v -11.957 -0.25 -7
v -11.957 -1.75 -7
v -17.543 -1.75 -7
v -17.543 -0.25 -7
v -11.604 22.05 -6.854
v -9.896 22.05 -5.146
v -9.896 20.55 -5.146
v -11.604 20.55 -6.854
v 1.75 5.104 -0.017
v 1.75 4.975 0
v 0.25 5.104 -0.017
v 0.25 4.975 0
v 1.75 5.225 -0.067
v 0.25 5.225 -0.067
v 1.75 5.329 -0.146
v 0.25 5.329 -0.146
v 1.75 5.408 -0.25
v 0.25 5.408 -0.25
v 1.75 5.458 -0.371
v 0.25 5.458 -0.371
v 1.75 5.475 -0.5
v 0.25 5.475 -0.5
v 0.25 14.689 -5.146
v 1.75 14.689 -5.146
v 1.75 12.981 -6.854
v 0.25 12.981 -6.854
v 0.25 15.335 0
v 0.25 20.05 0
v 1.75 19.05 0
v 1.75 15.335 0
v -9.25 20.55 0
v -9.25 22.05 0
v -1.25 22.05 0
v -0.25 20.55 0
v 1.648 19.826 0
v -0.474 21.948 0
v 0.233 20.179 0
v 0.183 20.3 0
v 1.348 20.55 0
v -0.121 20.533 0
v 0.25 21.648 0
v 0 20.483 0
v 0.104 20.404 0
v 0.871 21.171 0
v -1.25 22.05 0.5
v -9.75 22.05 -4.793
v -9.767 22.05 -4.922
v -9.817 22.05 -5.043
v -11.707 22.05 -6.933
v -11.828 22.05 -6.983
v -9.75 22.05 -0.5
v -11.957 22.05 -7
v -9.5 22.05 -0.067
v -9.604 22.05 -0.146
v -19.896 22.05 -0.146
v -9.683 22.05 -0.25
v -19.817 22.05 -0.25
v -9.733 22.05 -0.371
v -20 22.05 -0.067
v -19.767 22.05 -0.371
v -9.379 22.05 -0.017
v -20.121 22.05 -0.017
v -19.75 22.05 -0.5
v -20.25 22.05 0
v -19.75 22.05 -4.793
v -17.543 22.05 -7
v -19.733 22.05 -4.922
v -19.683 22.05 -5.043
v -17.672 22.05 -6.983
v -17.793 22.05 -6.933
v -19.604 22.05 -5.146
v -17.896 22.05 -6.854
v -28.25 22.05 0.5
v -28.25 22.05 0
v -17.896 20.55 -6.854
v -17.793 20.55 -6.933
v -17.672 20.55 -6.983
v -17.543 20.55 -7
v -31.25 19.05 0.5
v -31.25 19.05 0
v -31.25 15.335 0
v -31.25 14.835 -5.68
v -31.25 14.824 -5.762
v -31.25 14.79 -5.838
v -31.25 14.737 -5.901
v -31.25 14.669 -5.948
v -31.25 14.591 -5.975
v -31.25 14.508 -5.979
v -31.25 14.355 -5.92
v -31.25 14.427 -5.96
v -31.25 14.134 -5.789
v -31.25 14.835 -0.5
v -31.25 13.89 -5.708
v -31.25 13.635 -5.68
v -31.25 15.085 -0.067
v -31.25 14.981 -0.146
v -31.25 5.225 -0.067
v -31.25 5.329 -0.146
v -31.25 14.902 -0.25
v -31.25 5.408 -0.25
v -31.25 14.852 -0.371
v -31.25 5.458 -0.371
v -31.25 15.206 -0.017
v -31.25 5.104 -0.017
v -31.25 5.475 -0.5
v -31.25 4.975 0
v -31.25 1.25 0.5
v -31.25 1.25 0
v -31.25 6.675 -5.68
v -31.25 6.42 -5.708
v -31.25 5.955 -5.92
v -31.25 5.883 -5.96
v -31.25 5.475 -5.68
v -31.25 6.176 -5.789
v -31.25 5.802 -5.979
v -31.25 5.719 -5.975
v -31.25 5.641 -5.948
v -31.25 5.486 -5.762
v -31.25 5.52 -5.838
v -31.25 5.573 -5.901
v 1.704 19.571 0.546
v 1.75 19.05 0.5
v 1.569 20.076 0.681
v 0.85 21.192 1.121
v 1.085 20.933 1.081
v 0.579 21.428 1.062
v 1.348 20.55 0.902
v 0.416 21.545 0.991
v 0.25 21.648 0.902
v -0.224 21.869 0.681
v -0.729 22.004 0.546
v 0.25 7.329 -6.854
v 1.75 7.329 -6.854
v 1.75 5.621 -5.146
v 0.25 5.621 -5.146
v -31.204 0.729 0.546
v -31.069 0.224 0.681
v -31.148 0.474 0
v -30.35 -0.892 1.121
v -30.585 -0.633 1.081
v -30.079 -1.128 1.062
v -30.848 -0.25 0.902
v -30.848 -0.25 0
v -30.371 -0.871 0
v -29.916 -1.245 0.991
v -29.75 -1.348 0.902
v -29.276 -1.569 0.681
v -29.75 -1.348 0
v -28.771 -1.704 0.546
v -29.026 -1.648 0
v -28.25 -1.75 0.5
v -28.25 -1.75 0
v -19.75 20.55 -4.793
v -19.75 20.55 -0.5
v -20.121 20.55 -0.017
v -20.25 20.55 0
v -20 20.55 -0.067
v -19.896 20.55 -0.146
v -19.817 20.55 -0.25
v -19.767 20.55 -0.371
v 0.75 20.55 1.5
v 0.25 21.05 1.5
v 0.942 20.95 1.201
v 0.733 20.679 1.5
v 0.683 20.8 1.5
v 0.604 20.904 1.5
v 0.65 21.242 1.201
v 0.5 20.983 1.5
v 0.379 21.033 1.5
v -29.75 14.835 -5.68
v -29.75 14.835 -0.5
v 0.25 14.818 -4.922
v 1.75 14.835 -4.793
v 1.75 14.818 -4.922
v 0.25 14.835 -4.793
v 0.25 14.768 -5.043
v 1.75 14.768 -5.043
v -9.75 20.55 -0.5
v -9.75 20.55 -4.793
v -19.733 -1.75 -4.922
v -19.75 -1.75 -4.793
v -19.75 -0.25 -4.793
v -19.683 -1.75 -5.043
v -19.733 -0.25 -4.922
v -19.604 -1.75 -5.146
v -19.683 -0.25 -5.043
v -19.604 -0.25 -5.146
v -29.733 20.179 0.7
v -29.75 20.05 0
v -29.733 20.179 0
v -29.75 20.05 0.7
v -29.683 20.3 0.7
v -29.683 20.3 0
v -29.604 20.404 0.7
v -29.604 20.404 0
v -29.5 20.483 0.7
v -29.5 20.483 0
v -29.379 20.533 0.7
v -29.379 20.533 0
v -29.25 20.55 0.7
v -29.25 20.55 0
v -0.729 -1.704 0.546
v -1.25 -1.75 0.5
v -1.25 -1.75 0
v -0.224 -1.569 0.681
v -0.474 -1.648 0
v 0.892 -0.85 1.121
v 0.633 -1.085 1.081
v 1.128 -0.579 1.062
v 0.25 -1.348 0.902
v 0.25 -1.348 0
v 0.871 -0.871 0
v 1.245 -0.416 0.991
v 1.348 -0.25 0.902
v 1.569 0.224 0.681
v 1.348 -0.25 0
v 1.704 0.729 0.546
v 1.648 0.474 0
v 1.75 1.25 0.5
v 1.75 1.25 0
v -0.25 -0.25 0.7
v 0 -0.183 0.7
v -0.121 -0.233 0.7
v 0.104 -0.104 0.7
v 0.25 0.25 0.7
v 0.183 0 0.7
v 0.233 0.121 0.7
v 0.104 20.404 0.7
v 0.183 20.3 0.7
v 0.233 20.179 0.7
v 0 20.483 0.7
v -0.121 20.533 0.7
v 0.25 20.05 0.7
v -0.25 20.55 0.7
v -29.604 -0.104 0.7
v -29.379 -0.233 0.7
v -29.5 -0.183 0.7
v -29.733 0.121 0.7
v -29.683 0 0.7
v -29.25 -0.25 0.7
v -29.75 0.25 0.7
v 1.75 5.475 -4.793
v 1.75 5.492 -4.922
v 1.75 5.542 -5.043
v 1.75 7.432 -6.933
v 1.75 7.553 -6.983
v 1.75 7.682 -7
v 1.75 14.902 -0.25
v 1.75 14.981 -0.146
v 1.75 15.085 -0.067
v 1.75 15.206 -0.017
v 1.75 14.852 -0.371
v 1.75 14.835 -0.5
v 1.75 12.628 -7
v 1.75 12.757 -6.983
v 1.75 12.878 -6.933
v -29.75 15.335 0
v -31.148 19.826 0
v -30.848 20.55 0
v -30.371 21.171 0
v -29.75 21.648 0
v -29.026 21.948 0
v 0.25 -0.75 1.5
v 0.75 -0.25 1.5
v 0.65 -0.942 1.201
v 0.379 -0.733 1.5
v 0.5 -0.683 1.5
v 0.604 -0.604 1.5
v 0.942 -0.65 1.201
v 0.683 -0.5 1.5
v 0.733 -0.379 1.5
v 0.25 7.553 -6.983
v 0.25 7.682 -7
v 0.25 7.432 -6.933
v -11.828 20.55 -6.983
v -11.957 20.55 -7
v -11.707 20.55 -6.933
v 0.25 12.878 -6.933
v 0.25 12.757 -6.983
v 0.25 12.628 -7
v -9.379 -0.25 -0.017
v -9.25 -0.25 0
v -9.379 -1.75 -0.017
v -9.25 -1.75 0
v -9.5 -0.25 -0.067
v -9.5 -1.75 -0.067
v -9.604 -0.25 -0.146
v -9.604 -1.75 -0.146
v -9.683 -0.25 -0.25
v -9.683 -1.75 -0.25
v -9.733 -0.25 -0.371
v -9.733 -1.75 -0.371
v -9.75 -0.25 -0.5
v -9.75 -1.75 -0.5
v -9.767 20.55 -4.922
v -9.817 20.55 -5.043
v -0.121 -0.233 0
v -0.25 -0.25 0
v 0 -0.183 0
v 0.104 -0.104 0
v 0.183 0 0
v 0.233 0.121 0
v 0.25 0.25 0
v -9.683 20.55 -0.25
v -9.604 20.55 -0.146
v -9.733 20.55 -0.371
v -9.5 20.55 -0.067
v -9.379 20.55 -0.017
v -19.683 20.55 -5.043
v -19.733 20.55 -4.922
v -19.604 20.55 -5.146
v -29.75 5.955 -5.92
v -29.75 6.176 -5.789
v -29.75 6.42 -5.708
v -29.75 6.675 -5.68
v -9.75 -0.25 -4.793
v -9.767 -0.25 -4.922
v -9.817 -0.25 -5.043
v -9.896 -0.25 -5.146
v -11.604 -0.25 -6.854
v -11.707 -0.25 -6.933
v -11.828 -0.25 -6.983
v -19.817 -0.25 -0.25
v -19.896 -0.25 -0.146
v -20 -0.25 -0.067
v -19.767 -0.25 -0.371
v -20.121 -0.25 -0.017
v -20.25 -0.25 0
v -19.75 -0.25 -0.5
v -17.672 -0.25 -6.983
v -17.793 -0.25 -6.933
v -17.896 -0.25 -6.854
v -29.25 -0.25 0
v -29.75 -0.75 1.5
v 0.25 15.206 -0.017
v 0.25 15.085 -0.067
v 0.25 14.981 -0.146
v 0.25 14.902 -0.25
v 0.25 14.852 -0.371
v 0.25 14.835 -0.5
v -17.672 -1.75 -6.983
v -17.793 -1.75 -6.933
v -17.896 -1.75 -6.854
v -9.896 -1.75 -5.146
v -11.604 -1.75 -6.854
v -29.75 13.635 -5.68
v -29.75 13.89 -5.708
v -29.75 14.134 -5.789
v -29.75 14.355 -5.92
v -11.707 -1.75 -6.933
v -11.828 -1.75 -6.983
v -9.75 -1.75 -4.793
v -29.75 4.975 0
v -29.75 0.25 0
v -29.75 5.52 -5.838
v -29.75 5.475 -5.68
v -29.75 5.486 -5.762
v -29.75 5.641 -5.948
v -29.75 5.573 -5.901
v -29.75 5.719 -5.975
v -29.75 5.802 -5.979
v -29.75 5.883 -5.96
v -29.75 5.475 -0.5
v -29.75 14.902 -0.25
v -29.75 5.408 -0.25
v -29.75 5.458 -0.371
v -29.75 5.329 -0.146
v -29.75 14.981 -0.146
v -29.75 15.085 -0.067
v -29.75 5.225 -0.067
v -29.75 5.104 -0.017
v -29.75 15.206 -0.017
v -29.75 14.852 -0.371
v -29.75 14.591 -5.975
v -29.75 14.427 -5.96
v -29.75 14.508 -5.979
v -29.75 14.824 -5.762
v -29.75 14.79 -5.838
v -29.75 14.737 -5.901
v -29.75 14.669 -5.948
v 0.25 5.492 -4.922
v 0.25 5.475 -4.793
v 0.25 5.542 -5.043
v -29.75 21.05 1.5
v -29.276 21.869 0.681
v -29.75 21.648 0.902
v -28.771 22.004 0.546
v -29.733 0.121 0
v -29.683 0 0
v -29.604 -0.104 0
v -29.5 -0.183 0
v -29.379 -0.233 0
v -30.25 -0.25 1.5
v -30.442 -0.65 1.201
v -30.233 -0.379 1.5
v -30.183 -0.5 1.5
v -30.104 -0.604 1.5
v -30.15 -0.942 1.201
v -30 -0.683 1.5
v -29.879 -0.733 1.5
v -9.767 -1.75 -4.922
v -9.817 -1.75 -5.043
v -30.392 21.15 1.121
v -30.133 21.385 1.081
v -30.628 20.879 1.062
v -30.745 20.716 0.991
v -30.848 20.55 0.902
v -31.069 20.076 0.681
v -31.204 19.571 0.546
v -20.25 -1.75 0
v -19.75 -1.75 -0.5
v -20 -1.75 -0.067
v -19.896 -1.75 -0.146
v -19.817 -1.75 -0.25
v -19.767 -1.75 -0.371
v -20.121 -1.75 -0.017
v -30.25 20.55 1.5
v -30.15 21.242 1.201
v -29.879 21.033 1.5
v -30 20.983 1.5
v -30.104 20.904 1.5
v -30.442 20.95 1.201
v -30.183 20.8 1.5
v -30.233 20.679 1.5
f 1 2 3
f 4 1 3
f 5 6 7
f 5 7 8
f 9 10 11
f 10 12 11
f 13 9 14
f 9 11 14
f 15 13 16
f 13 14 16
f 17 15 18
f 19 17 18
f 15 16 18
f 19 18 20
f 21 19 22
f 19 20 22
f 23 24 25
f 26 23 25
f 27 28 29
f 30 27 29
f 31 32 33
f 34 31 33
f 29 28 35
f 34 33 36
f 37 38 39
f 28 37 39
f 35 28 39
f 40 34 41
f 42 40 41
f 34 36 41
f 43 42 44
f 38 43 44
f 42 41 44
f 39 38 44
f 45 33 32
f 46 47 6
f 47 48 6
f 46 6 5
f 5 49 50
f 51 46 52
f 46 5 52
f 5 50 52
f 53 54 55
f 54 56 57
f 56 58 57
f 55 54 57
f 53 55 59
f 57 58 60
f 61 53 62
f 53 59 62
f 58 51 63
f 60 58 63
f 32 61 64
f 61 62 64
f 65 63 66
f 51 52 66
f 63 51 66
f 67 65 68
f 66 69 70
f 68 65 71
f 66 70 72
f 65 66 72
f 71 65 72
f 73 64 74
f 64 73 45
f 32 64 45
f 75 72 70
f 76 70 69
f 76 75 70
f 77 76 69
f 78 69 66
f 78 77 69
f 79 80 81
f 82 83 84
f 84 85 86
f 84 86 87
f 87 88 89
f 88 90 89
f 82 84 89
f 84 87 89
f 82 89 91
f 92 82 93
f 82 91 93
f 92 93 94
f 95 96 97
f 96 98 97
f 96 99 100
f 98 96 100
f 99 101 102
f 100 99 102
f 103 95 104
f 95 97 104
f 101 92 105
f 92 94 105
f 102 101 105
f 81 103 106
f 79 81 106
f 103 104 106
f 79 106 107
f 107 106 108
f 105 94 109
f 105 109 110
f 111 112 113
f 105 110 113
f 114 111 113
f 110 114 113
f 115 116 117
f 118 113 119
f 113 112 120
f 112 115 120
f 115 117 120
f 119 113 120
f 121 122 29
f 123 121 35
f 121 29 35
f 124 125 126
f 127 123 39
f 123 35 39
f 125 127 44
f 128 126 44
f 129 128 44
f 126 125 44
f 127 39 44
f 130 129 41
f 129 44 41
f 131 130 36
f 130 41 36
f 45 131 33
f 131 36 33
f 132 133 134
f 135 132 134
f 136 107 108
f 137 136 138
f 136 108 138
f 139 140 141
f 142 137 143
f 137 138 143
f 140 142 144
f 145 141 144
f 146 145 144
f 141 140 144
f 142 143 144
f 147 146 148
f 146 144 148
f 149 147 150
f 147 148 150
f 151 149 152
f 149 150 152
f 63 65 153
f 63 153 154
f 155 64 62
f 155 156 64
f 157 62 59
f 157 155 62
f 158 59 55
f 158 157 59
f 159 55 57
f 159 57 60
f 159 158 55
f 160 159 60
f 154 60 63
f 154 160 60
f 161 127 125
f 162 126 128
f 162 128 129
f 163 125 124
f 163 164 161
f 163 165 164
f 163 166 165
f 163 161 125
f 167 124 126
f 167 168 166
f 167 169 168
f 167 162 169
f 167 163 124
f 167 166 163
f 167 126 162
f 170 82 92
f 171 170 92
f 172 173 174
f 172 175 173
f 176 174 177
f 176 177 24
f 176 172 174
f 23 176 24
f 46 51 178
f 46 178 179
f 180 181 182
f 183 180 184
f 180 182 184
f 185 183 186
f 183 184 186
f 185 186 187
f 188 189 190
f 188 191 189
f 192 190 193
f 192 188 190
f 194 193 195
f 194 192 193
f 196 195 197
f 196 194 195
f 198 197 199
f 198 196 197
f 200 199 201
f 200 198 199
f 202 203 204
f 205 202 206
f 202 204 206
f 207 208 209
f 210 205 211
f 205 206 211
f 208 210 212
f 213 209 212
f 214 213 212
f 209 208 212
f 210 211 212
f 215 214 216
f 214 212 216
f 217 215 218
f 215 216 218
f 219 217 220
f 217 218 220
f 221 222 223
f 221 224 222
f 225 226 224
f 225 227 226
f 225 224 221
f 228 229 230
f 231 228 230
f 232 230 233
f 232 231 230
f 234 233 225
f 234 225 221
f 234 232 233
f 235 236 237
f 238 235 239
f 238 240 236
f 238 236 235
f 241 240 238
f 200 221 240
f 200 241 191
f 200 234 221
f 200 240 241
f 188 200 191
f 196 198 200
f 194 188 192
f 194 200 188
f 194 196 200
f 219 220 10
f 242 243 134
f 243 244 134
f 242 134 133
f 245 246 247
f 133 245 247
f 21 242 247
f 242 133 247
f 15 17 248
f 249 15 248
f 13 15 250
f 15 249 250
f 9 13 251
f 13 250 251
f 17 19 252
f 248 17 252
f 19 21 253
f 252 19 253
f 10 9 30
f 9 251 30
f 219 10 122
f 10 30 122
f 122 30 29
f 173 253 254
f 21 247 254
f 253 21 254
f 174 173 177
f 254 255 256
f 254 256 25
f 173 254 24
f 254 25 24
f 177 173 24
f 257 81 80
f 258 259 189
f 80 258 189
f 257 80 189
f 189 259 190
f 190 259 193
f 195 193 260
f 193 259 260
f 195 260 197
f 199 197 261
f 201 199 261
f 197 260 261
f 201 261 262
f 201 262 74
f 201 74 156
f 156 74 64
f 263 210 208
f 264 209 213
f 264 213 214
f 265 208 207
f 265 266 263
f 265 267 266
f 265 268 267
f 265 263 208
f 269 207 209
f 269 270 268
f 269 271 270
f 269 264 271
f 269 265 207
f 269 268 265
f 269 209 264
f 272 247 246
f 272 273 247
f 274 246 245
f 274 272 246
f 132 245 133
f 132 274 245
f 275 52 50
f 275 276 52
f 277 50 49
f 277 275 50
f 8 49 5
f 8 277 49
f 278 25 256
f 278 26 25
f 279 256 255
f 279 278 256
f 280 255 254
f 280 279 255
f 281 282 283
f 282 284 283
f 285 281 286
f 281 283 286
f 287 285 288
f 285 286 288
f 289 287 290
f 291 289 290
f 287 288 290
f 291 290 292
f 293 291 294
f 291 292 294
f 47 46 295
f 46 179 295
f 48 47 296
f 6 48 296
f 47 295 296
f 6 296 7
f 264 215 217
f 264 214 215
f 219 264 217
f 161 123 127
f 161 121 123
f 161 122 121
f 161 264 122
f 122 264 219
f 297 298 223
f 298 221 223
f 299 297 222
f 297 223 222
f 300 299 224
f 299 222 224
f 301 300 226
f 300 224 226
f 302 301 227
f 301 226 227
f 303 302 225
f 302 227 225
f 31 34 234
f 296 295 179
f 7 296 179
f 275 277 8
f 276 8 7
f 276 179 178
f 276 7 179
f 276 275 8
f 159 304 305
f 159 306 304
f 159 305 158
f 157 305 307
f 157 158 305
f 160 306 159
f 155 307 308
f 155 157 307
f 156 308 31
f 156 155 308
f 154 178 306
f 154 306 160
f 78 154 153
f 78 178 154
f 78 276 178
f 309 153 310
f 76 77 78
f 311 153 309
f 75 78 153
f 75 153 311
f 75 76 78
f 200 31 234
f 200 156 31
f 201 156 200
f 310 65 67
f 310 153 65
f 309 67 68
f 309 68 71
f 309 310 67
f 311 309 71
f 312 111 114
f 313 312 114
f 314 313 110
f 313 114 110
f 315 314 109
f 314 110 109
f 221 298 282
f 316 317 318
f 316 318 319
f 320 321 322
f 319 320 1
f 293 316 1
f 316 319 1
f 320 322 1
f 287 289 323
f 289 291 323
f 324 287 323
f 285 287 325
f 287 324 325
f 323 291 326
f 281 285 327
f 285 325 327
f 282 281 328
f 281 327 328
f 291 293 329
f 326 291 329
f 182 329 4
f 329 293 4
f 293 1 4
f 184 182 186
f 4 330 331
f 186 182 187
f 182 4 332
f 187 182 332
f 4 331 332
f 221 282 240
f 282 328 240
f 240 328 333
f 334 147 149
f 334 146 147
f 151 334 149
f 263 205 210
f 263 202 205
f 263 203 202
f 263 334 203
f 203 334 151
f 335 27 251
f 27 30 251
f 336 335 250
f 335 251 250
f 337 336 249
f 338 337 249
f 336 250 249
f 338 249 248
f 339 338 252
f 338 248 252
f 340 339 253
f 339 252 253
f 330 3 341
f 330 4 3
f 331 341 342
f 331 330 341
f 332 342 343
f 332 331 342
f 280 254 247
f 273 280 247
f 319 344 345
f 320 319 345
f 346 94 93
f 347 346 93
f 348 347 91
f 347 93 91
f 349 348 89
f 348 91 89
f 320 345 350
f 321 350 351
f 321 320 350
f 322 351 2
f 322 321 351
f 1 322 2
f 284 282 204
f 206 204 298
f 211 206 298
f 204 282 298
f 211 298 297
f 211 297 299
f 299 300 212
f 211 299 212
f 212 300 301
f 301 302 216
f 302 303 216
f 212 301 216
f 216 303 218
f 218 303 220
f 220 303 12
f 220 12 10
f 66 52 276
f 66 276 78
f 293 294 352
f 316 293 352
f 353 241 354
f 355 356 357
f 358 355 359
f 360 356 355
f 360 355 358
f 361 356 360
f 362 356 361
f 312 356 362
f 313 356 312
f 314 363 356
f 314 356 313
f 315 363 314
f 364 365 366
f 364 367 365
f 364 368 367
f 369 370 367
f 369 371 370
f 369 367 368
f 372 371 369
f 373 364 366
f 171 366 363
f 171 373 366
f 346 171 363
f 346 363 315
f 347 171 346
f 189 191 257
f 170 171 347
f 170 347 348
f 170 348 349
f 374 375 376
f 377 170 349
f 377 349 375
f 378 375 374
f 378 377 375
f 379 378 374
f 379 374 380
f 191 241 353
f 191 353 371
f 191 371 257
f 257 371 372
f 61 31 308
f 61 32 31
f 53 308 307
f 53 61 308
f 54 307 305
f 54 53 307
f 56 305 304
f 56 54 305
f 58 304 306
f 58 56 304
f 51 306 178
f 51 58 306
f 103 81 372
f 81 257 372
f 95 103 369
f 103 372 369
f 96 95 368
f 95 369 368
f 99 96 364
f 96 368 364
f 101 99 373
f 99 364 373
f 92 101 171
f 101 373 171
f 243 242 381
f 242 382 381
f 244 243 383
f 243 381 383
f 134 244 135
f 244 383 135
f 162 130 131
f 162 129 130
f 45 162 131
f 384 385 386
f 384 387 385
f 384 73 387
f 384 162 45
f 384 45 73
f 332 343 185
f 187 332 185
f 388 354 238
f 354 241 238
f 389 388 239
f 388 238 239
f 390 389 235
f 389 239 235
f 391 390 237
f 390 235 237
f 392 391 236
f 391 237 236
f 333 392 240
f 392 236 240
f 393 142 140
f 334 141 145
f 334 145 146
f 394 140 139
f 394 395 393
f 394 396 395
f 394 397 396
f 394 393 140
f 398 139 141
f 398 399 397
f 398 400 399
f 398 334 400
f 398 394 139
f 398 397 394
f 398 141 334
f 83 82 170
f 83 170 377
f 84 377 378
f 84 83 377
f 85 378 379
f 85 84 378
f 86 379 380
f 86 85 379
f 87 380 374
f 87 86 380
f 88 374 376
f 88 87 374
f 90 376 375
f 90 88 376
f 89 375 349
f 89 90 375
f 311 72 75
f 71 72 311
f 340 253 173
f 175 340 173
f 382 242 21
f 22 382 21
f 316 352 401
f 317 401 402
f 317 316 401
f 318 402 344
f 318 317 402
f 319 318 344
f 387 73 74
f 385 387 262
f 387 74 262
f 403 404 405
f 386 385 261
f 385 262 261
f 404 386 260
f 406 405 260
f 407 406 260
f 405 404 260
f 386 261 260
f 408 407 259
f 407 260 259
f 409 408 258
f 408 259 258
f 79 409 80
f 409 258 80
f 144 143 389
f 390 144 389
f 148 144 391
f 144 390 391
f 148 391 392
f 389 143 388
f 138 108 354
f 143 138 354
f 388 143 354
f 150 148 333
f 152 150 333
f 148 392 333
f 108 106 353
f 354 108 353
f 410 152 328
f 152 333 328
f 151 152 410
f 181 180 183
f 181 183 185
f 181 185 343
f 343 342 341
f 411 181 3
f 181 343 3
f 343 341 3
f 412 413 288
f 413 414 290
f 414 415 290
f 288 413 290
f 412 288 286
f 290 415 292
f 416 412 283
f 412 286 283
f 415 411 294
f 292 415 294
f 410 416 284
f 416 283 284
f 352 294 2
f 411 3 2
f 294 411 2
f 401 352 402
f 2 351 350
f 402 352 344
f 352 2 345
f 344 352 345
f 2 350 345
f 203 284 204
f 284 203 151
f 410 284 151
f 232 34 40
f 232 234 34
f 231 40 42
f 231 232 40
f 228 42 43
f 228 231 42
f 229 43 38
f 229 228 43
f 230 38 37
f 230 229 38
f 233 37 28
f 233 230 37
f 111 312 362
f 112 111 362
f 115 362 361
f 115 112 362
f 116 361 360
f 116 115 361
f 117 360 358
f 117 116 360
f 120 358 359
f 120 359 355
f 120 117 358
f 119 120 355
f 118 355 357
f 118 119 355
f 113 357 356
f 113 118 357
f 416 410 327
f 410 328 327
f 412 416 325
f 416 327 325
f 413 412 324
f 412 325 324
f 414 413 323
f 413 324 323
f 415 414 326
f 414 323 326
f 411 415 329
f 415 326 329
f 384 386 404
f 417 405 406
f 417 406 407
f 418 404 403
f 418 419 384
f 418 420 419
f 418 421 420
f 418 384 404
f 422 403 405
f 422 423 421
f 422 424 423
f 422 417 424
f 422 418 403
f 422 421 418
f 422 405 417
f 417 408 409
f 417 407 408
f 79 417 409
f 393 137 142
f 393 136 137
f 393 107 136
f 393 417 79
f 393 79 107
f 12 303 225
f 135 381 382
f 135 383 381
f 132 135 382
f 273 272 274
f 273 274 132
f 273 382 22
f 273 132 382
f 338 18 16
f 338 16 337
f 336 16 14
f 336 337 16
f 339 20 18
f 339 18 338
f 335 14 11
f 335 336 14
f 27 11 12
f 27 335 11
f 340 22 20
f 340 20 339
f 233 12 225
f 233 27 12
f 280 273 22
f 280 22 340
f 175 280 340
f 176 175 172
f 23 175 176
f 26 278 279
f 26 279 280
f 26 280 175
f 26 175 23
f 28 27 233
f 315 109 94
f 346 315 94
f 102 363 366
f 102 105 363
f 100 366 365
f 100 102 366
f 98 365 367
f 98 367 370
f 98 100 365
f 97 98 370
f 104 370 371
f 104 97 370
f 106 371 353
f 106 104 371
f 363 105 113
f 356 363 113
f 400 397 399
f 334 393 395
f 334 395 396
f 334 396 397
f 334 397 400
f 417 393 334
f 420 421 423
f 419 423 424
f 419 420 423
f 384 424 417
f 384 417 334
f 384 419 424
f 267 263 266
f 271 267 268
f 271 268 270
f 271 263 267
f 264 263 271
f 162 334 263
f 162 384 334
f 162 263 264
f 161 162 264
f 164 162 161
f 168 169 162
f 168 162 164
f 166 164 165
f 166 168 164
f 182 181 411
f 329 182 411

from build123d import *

# Parameters (mm, degrees)
EXTRUDE_1_DEPTH     = 1.5
CHAMFER_1_SIZE      = 1
EXTRUDE_3_DEPTH     = 1.5
EXTRUDE_4_DEPTH     = 1.5
EXTRUDE_5_DEPTH     = 1.5
FILLET_START        = -32
FILLET_2_DEPTH      = 3
FILLET_3_R          = 0.5
SKETCH_8_W          = 30
SKETCH_8_H          = 20.8
CUT_EXTRUDE_1_DEPTH = 0.7
FILLET_4_R          = 0.5
CUT_EXTRUDE_8_DEPTH = 39.881422299


with BuildPart() as part:
    # 草图1 → 凸台-拉伸1 (new body)
    with BuildSketch(Plane.XY):
        with BuildLine():
            Line((-29.75, -1.75), (-19.75, -1.75))
            Line((-19.75, -1.75), (-9.75, -1.75))
            Line((-9.75, -1.75), (0.25, -1.75))
            ThreePointArc((0.25, -1.75), (1.310660172, -1.310660172), (1.75, -0.25))
            Line((1.75, -0.25), (1.75, 5.475))
            Line((1.75, 5.475), (1.75, 14.835))
            Line((1.75, 14.835), (1.75, 20.55))
            ThreePointArc((1.75, 20.55), (1.310660172, 21.610660172), (0.25, 22.05))
            Line((0.25, 22.05), (-9.75, 22.05))
            Line((-9.75, 22.05), (-19.75, 22.05))
            Line((-19.75, 22.05), (-29.75, 22.05))
            ThreePointArc((-29.75, 22.05), (-30.810660172, 21.610660172), (-31.25, 20.55))
            Line((-31.25, 20.55), (-31.25, 14.835))
            Line((-31.25, 14.835), (-31.25, 5.475))
            Line((-31.25, 5.475), (-31.25, -0.25))
            ThreePointArc((-31.25, -0.25), (-30.810660172, -1.310660172), (-29.75, -1.75))
        make_face()
    extrude(amount=EXTRUDE_1_DEPTH)

    # 倒角1
    chamfer_1_edges = [part.edges().sort_by_distance(p)[0] for p in [
        (-14.75, -1.75, 1.5),
        (1.310660172, -1.310660172, 1.5),
        (1.75, 10.15, 1.5),
        (1.310660172, 21.610660172, 1.5),
        (-14.75, 22.05, 1.5),
        (-31.25, 10.15, 1.5),
        (-30.810660172, 21.610660172, 1.5),
        (-30.810660172, -1.310660172, 1.5),
    ]]
    chamfer(chamfer_1_edges, length=CHAMFER_1_SIZE)

    # 草图3 → 凸台-拉伸3 (add)
    with BuildSketch(Plane(origin=(0, 22.05, 0), x_dir=(1, 0, 0), z_dir=(0, 1, 0))):
        Polygon((-19.75, -0.450892119), (-9.75, -0.450892119), (-9.75, 5), (-11.75, 7), (-17.75, 7), (-19.75, 5), align=None)
    extrude_3 = extrude(amount=-EXTRUDE_3_DEPTH)

    # 镜向1: 凸台-拉伸3 across plane
    add(extrude_3.mirror(Plane.ZX.offset(10.15)))

    # 草图4 → 凸台-拉伸4 (add)
    with BuildSketch(Plane(origin=(1.75, 0, 0), x_dir=(0, 0, -1), z_dir=(1, 0, 0))):
        Polygon((-0.4, 14.835), (5, 14.835), (7, 12.835), (7, 7.475), (5, 5.475), (-0.4, 5.475), align=None)
    extrude(amount=-EXTRUDE_4_DEPTH)

    # 草图6 → 凸台-拉伸5 (add)
    with BuildSketch(Plane.ZY.offset(31.25)):
        with BuildLine():
            Line((0.32, 14.835), (0.32, 5.475))
            Line((0.32, 5.475), (-6.88, 5.475))
            ThreePointArc((-6.88, 5.475), (-6.031471863, 5.826471863), (-5.68, 6.675))
            Line((-5.68, 6.675), (-5.68, 13.635))
            ThreePointArc((-5.68, 13.635), (-6.031471863, 14.483528137), (-6.88, 14.835))
            Line((-6.88, 14.835), (0.32, 14.835))
        make_face()
    extrude(amount=-EXTRUDE_5_DEPTH)

    # 圆角2: read off the stored shape, not the designer's step
    # 圆角2 outline → 圆角2 (cut)
    with BuildSketch(Plane.YZ.offset(FILLET_START)):
        with BuildLine():
            Line((14.835, -6.88), (14.835, -5.68))
            ThreePointArc((14.835, -5.68), (14.669164079, -5.948328157), (14.355, -5.92))
            ThreePointArc((14.355, -5.92), (14.708312629, -6.343343686), (14.835, -6.88))
        make_face()
        with BuildLine():
            ThreePointArc((5.475, -6.88), (5.601687371, -6.343343686), (5.955, -5.92))
            ThreePointArc((5.955, -5.92), (5.640835921, -5.948328157), (5.475, -5.68))
            Line((5.475, -5.68), (5.475, -6.88))
        make_face()
    extrude(amount=FILLET_2_DEPTH, mode=Mode.SUBTRACT)

    # 圆角3
    fillet_3_edges = [part.edges().sort_by_distance(p)[0] for p in [
        (-9.75, -1, 0),
        (-19.75, -1, 0),
        (-19.75, -1, -5),
        (-9.75, -1, -5),
        (-11.75, -1, -7),
        (-17.75, -1, -7),
        (1, 5.475, -5),
        (1, 14.835, 0),
        (1, 14.835, -5),
        (1, 12.835, -7),
        (1, 7.475, -7),
        (1, 5.475, 0),
        (-30.5, 14.835, 0),
        (-30.5, 5.475, 0),
        (-9.75, 21.3, 0),
        (-19.75, 21.3, 0),
        (-9.75, 21.3, -5),
        (-19.75, 21.3, -5),
        (-17.75, 21.3, -7),
        (-11.75, 21.3, -7),
    ]]
    fillet(fillet_3_edges, radius=FILLET_3_R)

    # 草图8 → 切除-拉伸1 (cut)
    with BuildSketch(Plane(origin=(0, 0, 0), x_dir=(-1, 0, 0), z_dir=(0, 0, -1))):
        with Locations((14.75, 10.15)):
            Rectangle(SKETCH_8_W, SKETCH_8_H)
    extrude(amount=-CUT_EXTRUDE_1_DEPTH, mode=Mode.SUBTRACT)

    # 圆角4
    fillet_4_edges = [part.edges().sort_by_distance(p)[0] for p in [
        (-29.75, 20.55, 0.35),
        (-29.75, -0.25, 0.35),
        (0.25, -0.25, 0.35),
        (0.25, 20.55, 0.35),
    ]]
    fillet(fillet_4_edges, radius=FILLET_4_R)

    # 草图12 → 切除-拉伸8 (cut, through all)
    with BuildSketch(Plane(origin=(0, 0, 0), x_dir=(-1, 0, 0), z_dir=(0, 0, -1))):
        with BuildLine():
            Line((1.25, 22.05), (-0.25, 22.05))
            ThreePointArc((-0.25, 22.05), (-1.310660172, 21.610660172), (-1.75, 20.55))
            Line((-1.75, 20.55), (-1.75, 19.05))
            ThreePointArc((-1.75, 19.05), (-0.871320344, 21.171320344), (1.25, 22.05))
        make_face()
        with BuildLine():
            Line((31.25, 19.05), (31.25, 20.55))
            ThreePointArc((31.25, 20.55), (30.810660172, 21.610660172), (29.75, 22.05))
            Line((29.75, 22.05), (28.25, 22.05))
            ThreePointArc((28.25, 22.05), (30.371320344, 21.171320344), (31.25, 19.05))
        make_face()
        with BuildLine():
            Line((28.25, -1.75), (29.75, -1.75))
            ThreePointArc((29.75, -1.75), (30.810660172, -1.310660172), (31.25, -0.25))
            Line((31.25, -0.25), (31.25, 1.25))
            ThreePointArc((31.25, 1.25), (30.371320344, -0.871320344), (28.25, -1.75))
        make_face()
        with BuildLine():
            Line((-1.75, 1.25), (-1.75, -0.25))
            ThreePointArc((-1.75, -0.25), (-1.310660172, -1.310660172), (-0.25, -1.75))
            Line((-0.25, -1.75), (1.25, -1.75))
            ThreePointArc((1.25, -1.75), (-0.871320344, -0.871320344), (-1.75, 1.25))
        make_face()
    extrude(amount=-CUT_EXTRUDE_8_DEPTH, mode=Mode.SUBTRACT)


solid = part.part
